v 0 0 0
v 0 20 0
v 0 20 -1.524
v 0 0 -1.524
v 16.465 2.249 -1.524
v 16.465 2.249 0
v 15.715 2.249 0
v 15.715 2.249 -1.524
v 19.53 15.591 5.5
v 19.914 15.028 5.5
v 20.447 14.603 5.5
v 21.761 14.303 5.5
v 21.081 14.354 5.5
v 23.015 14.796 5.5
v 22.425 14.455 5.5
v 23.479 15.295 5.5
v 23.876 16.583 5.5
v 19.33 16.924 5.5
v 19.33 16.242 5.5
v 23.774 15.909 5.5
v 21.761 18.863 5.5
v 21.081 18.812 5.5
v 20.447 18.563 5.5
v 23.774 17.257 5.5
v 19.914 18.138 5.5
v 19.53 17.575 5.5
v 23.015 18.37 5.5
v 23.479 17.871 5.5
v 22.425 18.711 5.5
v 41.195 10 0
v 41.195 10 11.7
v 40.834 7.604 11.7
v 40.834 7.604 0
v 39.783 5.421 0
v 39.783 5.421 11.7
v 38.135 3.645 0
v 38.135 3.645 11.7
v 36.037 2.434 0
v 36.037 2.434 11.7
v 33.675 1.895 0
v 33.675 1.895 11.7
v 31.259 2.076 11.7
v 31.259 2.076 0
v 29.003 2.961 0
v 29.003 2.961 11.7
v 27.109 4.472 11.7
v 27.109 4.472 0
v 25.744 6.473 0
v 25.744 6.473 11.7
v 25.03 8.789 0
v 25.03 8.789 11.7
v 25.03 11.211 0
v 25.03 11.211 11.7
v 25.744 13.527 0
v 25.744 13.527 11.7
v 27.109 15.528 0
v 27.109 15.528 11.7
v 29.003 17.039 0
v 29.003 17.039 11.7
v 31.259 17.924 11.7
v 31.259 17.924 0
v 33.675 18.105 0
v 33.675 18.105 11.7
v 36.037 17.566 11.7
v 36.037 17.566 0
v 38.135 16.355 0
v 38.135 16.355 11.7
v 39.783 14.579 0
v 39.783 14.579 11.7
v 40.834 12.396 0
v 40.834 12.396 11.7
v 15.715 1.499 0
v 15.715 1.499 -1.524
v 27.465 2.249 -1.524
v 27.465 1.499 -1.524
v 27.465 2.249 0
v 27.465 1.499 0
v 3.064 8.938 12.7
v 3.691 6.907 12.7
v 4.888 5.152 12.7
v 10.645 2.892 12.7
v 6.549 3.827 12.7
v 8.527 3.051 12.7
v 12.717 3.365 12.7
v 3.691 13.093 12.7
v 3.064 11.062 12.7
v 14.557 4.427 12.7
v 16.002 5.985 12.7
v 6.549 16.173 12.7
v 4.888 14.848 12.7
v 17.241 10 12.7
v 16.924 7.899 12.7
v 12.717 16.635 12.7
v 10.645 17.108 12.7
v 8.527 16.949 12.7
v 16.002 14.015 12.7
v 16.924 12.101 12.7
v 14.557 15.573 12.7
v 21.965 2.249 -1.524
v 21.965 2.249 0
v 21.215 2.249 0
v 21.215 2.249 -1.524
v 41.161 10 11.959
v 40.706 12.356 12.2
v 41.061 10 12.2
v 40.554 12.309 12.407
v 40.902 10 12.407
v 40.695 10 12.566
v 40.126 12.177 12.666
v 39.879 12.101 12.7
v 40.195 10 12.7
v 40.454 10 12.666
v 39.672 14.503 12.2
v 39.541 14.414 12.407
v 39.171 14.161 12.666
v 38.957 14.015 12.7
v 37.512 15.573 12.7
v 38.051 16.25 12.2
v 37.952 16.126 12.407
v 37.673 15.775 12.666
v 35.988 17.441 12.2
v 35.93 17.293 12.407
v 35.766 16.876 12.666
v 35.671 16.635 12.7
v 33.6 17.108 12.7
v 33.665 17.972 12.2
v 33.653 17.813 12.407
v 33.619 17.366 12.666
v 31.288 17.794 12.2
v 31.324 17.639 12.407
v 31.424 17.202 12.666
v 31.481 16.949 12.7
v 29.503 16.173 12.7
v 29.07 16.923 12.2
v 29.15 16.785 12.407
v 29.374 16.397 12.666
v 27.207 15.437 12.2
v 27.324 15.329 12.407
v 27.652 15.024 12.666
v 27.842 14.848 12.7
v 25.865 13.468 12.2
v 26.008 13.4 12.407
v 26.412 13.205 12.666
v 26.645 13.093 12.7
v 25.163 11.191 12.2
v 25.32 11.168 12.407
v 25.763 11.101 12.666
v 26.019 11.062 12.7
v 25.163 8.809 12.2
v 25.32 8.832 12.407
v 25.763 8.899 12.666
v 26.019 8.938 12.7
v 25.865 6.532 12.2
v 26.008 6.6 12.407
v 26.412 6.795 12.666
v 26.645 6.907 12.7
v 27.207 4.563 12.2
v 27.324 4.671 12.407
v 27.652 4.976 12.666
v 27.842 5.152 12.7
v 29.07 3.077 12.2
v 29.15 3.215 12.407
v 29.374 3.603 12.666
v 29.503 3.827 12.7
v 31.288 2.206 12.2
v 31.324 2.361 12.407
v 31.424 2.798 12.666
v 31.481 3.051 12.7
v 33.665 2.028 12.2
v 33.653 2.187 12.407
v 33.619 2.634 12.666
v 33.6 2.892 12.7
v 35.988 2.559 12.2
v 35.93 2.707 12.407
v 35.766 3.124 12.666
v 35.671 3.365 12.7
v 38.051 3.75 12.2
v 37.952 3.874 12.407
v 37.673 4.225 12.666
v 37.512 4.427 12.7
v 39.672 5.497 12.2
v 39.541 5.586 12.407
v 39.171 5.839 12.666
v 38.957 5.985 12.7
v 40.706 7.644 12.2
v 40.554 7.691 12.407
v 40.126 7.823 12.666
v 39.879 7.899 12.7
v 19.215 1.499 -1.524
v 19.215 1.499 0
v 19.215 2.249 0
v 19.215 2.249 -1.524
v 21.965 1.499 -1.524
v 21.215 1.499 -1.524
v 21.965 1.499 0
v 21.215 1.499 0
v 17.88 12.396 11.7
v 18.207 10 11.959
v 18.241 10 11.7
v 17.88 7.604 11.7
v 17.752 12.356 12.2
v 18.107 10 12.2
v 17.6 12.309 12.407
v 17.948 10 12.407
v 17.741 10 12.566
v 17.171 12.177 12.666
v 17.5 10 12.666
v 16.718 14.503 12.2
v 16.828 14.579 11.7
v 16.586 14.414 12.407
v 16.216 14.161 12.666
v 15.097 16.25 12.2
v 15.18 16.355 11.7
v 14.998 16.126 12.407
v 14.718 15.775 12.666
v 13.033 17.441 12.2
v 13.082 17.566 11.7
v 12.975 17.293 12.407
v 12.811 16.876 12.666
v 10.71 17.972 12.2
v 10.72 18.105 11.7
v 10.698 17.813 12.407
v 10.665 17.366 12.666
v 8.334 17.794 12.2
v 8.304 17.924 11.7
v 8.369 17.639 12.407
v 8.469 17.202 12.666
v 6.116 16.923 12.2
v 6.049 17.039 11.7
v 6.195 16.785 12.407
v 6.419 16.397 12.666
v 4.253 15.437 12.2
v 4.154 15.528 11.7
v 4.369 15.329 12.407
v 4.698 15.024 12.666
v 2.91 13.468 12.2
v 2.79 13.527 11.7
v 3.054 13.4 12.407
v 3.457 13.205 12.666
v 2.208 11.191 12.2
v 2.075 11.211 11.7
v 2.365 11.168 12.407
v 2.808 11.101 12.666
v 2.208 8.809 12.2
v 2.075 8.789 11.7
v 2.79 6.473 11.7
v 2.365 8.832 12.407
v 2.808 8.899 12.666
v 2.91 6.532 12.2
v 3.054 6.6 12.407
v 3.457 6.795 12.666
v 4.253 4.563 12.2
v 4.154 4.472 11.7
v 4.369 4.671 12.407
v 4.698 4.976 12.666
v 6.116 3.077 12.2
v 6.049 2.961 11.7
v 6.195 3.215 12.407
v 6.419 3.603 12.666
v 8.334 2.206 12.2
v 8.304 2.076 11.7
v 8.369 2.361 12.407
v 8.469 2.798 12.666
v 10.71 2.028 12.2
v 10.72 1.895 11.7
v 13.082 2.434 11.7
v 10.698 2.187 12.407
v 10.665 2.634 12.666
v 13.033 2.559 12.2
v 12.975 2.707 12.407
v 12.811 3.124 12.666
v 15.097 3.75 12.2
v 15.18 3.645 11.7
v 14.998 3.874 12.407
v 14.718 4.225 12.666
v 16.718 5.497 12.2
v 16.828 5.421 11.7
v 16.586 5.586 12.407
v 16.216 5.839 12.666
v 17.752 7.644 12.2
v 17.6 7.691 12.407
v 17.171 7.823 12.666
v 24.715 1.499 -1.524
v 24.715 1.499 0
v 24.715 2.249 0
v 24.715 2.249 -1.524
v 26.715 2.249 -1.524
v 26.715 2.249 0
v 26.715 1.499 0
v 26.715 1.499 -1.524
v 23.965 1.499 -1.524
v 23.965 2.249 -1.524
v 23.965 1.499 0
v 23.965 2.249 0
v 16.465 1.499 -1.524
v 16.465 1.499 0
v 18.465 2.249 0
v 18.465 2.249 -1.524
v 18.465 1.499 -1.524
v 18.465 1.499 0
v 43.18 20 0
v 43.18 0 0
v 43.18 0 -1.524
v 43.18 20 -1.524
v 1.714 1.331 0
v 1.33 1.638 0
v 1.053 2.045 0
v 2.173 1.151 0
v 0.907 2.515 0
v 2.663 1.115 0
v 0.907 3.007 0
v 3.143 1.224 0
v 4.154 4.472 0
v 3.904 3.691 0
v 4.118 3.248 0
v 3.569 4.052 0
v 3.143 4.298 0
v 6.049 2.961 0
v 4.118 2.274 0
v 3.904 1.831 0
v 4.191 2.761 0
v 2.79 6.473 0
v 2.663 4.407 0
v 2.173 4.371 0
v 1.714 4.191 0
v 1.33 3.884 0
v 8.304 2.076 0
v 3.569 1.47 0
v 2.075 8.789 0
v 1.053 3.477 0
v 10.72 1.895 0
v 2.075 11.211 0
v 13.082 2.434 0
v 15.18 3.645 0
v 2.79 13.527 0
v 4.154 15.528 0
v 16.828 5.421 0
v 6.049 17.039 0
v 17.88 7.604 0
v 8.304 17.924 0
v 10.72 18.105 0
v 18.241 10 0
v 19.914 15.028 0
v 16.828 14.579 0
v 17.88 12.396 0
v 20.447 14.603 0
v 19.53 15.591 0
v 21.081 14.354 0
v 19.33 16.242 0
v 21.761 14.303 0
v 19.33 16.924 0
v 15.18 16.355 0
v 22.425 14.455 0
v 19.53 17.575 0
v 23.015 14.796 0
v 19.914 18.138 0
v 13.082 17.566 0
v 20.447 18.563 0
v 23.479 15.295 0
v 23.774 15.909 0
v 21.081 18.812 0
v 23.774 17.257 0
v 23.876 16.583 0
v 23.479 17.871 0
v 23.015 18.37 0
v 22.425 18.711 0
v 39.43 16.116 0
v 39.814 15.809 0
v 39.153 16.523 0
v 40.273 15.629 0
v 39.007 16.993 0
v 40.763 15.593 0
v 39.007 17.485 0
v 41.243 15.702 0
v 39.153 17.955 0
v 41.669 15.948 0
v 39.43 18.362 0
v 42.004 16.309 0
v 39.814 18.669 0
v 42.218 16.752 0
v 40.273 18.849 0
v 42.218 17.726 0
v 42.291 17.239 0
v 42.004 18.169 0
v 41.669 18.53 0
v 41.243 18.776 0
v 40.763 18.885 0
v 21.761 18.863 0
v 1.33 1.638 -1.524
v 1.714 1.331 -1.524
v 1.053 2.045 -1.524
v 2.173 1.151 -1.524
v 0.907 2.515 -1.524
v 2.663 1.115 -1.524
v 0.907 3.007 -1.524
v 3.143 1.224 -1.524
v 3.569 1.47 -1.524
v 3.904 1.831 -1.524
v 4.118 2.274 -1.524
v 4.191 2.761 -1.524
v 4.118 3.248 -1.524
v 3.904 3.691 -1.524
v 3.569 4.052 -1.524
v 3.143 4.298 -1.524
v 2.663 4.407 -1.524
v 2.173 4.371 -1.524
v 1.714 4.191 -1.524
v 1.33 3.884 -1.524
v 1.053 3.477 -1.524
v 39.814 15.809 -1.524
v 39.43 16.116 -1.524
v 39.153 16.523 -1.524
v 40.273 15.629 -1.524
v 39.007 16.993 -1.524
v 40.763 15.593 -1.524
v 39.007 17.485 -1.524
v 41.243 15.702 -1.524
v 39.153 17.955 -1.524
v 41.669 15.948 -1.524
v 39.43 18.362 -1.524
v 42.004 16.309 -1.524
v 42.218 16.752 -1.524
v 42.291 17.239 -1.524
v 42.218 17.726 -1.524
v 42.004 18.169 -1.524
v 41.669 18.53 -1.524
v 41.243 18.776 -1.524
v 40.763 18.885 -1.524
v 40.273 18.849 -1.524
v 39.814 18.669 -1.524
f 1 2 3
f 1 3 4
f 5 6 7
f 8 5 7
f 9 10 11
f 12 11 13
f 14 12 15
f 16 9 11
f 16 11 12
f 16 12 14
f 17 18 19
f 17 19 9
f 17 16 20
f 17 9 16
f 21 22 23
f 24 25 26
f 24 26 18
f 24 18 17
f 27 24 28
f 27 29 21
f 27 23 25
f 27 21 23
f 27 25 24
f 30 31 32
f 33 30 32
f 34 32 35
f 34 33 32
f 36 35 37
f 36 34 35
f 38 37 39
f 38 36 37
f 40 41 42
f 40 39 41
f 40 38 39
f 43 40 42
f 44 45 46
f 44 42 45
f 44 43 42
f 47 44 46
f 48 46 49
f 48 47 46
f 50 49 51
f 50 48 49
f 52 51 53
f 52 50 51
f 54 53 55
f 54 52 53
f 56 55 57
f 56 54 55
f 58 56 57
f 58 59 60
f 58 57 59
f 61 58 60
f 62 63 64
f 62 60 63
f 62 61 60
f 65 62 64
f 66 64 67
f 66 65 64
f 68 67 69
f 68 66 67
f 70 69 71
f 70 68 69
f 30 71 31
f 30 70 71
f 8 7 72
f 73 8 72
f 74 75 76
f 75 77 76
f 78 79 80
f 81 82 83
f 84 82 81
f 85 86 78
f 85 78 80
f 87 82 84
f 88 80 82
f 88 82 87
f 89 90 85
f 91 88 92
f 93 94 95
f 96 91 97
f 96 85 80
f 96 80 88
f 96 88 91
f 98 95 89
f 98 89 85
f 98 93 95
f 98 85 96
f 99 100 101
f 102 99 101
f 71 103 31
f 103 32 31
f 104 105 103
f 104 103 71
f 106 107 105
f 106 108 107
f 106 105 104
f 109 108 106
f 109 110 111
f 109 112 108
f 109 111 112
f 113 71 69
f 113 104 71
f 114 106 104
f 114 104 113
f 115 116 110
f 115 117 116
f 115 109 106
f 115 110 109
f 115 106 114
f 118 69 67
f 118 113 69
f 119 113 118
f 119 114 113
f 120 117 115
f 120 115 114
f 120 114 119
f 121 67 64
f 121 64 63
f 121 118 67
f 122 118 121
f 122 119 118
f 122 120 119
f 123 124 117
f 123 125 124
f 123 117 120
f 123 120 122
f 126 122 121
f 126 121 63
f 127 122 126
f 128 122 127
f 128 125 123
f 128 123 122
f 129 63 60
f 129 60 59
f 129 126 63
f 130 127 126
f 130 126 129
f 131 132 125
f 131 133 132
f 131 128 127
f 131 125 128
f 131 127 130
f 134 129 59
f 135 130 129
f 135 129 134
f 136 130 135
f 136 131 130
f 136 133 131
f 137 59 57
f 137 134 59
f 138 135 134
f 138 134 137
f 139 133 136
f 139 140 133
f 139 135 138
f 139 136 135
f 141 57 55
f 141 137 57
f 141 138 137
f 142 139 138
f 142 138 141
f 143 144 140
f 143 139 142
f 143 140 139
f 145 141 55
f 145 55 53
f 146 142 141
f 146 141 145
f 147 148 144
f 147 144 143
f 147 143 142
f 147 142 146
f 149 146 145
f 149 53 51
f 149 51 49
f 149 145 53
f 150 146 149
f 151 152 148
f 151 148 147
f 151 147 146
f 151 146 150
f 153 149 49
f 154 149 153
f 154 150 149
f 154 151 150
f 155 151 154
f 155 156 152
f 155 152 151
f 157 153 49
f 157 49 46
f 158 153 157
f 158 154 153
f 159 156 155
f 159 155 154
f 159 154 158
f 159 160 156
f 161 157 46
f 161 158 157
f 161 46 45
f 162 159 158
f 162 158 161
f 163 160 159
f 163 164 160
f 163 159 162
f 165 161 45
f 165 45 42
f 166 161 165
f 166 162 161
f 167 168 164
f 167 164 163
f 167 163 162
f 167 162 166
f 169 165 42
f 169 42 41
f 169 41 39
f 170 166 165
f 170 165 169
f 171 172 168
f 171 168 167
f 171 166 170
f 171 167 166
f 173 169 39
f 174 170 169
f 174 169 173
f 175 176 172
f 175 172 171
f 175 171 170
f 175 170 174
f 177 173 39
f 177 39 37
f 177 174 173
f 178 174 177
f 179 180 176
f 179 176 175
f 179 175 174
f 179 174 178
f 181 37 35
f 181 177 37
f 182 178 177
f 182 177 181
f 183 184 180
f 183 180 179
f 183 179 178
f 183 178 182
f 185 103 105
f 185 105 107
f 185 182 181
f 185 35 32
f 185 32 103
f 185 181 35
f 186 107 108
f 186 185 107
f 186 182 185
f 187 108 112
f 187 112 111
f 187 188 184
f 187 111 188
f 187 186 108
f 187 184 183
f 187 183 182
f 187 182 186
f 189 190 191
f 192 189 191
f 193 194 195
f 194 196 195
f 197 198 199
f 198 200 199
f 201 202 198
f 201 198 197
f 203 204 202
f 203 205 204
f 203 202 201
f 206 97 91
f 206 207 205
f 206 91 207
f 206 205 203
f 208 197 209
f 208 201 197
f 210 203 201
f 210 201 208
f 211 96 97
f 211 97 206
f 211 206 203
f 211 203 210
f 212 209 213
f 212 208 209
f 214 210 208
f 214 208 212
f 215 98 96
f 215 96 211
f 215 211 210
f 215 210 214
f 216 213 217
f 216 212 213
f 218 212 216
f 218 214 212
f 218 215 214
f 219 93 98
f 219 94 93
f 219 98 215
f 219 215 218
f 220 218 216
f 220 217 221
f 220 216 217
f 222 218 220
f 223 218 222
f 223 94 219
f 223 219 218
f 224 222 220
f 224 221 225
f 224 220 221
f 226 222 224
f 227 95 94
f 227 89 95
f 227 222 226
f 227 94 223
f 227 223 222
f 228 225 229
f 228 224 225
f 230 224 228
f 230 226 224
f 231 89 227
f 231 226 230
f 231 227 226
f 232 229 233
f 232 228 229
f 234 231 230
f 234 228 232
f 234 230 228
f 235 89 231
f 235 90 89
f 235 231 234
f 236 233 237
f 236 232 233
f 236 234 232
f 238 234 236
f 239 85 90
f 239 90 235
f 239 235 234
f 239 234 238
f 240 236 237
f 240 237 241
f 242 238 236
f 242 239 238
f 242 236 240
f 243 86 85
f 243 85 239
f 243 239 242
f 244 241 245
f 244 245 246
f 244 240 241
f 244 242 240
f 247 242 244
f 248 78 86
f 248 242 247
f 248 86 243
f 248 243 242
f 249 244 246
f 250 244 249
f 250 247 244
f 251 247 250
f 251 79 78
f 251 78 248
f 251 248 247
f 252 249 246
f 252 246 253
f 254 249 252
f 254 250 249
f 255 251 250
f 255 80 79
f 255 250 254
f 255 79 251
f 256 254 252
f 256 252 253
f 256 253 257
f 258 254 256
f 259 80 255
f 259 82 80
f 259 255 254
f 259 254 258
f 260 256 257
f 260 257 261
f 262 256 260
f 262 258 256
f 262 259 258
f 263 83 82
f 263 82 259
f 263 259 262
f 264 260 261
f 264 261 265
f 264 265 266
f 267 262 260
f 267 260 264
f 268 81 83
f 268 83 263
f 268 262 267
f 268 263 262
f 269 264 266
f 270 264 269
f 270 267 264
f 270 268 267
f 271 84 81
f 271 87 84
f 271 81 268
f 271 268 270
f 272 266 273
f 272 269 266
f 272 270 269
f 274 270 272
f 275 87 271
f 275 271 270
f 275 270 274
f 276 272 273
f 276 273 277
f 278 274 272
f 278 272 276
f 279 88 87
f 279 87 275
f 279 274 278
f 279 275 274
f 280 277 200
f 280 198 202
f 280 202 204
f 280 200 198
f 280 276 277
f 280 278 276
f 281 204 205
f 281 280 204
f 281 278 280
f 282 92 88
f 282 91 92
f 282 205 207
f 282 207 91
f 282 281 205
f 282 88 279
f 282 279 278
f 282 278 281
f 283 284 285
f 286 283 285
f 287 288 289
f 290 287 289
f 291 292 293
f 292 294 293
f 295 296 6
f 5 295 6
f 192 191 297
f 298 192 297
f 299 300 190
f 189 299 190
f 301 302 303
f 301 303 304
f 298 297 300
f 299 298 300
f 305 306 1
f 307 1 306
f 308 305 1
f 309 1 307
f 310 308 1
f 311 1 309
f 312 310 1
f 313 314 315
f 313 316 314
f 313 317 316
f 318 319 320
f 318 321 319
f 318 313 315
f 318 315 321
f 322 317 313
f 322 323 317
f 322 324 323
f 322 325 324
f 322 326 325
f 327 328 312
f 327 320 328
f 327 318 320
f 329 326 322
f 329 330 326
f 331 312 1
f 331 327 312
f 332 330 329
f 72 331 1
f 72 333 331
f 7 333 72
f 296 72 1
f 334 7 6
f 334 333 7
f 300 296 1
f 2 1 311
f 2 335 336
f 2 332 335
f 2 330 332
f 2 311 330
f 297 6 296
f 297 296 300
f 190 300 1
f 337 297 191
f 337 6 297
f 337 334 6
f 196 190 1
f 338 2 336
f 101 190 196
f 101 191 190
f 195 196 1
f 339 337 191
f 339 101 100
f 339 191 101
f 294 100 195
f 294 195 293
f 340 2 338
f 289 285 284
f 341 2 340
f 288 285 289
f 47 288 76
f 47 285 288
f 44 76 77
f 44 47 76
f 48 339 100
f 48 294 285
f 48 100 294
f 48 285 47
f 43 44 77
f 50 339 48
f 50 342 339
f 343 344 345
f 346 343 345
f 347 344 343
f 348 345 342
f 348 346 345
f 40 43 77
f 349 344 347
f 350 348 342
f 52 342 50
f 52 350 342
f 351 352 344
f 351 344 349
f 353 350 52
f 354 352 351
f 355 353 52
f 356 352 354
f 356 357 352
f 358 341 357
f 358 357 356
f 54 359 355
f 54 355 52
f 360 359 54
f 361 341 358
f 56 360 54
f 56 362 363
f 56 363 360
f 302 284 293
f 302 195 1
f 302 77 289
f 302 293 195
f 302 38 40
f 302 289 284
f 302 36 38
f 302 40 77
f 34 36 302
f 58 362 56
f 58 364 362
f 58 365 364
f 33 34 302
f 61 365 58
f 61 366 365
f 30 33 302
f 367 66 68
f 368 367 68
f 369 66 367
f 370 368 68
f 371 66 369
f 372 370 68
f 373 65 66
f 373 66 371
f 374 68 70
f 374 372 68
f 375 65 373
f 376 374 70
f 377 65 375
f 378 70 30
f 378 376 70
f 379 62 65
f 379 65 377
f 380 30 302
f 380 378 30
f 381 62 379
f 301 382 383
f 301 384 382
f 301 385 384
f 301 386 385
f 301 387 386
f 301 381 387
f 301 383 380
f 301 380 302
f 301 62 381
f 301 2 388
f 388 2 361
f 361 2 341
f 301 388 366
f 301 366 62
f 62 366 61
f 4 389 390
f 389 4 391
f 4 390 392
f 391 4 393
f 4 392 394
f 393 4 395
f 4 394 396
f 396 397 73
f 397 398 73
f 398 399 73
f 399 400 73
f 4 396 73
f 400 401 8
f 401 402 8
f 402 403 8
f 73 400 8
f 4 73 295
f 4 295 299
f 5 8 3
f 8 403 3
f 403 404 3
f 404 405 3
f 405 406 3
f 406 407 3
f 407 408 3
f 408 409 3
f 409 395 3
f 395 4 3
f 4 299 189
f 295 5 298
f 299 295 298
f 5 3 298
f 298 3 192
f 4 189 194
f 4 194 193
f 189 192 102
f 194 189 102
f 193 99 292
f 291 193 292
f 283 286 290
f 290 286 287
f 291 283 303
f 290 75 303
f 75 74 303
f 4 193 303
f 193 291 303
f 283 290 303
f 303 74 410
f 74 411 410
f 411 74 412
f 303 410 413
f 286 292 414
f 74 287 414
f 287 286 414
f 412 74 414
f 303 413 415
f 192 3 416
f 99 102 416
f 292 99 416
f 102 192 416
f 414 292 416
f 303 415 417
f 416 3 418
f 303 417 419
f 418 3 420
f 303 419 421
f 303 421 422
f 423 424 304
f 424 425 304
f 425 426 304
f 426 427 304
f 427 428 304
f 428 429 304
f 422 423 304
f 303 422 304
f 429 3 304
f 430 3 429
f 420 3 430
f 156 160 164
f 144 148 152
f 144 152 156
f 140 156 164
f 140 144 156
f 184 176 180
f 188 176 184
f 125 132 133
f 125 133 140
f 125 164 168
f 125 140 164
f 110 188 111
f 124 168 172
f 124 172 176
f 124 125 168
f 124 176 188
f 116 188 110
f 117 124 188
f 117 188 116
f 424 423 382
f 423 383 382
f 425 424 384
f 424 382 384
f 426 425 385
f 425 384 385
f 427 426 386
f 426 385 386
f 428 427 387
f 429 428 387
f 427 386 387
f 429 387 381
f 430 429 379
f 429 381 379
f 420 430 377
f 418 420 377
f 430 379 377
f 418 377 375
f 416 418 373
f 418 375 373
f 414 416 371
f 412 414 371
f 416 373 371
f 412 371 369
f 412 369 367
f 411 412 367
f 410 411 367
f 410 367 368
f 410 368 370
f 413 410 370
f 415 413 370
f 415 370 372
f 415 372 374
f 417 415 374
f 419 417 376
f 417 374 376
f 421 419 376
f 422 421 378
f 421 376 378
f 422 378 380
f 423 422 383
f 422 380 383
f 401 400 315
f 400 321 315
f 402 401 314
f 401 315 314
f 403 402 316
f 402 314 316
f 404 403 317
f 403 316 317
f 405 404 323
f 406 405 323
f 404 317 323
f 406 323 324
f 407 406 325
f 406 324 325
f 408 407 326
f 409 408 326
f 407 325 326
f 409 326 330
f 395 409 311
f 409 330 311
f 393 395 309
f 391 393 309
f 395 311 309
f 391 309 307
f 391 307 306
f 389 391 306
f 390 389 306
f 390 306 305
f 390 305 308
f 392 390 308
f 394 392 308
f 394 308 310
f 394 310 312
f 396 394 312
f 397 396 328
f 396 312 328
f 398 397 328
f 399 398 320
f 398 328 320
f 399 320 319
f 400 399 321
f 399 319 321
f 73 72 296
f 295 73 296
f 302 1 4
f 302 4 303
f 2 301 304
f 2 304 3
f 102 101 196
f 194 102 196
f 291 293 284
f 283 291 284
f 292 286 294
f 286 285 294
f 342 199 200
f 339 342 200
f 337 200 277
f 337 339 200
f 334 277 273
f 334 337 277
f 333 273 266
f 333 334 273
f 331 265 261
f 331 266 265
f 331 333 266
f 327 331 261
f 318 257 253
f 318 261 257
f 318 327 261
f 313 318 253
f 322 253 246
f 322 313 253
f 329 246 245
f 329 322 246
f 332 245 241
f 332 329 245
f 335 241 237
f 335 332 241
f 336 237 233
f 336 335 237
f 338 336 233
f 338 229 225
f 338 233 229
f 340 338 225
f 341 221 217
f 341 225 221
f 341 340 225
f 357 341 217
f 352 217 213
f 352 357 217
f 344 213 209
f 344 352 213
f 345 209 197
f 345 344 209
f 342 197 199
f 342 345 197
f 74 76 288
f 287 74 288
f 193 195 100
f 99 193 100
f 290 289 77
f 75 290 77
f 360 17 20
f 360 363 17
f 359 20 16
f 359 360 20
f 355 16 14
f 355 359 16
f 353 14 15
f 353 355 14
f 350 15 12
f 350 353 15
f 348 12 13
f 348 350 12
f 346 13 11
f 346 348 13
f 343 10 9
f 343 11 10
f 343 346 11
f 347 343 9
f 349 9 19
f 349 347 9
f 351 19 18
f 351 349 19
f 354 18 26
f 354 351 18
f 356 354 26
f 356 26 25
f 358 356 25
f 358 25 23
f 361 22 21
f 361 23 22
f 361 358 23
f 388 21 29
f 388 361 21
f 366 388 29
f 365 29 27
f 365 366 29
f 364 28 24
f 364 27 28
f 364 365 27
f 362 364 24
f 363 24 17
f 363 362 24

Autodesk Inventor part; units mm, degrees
ref_plane "YZ Plane" through (0, 0, 0) normal (1, 0, 0) x (0, 1, 0)
ref_plane "XZ Plane" through (0, 0, 0) normal (0, 1, 0) x (-1, 0, 0)
ref_plane "XY Plane" through (0, 0, 0) normal (0, 0, 1) x (1, 0, 0)
sketch "Skizze1" plane through (0, 0, 0) normal (0, 0, 1) x (1, 0, 0)
  line L0 (0, 0) -> (43.18, 0)
  line L1 (43.18, 0) -> (43.18, 20)
  line L2 (43.18, 20) -> (0, 20)
  line L3 (0, 20) -> (0, 0)
  circle A0 centre (2.54, 2.761) radius 1.651
  circle A1 centre (40.64, 17.239) radius 1.651
  line L4 (21.59, 20) -> (21.59, 0) construction
  line L5 (2.54, 2.761) -> (40.64, 2.761) construction
  line L6 (40.64, 2.761) -> (40.64, 17.239) construction
  line L7 (40.64, 17.239) -> (2.54, 17.239) construction
  line L8 (2.54, 17.239) -> (2.54, 2.761) construction
  line L9 (0, 10) -> (43.18, 10) construction
  line L10 (21.965, 2.2486) -> (21.215, 2.2486)
  line L11 (21.215, 2.2486) -> (21.215, 1.4986)
  line L12 (21.215, 1.4986) -> (21.965, 1.4986)
  line L13 (21.965, 1.4986) -> (21.965, 2.2486)
  line L14 (24.715, 2.2486) -> (23.965, 2.2486)
  line L15 (24.715, 1.4986) -> (24.715, 2.2486)
  line L16 (23.965, 1.4986) -> (24.715, 1.4986)
  line L17 (23.965, 2.2486) -> (23.965, 1.4986)
  line L18 (27.465, 2.2486) -> (26.715, 2.2486)
  line L19 (27.465, 1.4986) -> (27.465, 2.2486)
  line L20 (26.715, 1.4986) -> (27.465, 1.4986)
  line L21 (26.715, 2.2486) -> (26.715, 1.4986)
  line L22 (19.215, 2.2486) -> (18.465, 2.2486)
  line L23 (19.215, 1.4986) -> (19.215, 2.2486)
  line L24 (18.465, 1.4986) -> (19.215, 1.4986)
  line L25 (18.465, 2.2486) -> (18.465, 1.4986)
  line L26 (21.965, 2.2486) -> (21.215, 2.2486)
  line L27 (21.965, 1.4986) -> (21.965, 2.2486)
  line L28 (21.215, 1.4986) -> (21.965, 1.4986)
  line L29 (21.215, 2.2486) -> (21.215, 1.4986)
  line L30 (24.715, 2.2486) -> (23.965, 2.2486)
  line L31 (24.715, 1.4986) -> (24.715, 2.2486)
  line L32 (23.965, 1.4986) -> (24.715, 1.4986)
  line L33 (23.965, 2.2486) -> (23.965, 1.4986)
  line L34 (16.465, 2.2486) -> (15.715, 2.2486)
  line L35 (16.465, 1.4986) -> (16.465, 2.2486)
  line L36 (15.715, 1.4986) -> (16.465, 1.4986)
  line L37 (15.715, 2.2486) -> (15.715, 1.4986)
  line L38 (19.215, 2.2486) -> (18.465, 2.2486)
  line L39 (19.215, 1.4986) -> (19.215, 2.2486)
  line L40 (18.465, 1.4986) -> (19.215, 1.4986)
  line L41 (18.465, 2.2486) -> (18.465, 1.4986)
  line L42 (21.965, 2.2486) -> (21.215, 2.2486)
  line L43 (21.965, 1.4986) -> (21.965, 2.2486)
  line L44 (21.215, 1.4986) -> (21.965, 1.4986)
  line L45 (21.215, 2.2486) -> (21.215, 1.4986)
  point P0 (21.59, 17.239)
  point P1 (40.64, 10)
  point P2 (21.59, 2.2486)
  point P3 (24.34, 2.2486)
  point P4 (27.09, 2.2486)
  point P5 (18.84, 2.2486)
  point P6 (21.59, 2.2486)
  point P7 (24.34, 2.2486)
  point P8 (16.09, 2.2486)
  point P9 (18.84, 2.2486)
  point P10 (21.59, 2.2486)
  dimension "d0" = 43.18
  dimension "d1" = 20
  dimension "d2" = 3.302
  dimension "d4" = 38.1
  dimension "d5" = 14.478
  dimension "d26" = 1.4986
  dimension "d27" = 0.75
  dimension "d30" = 2.75
  dimension "d33" = 2.75
extrude "Extrusion1" add sketch "Skizze1" against normal blind 1.524
sketch "Skizze2" plane through (0, 0, 0) normal (0, 0, 1) x (1, 0, 0)
  circle A0 centre (10.1127, 10) radius 8.128
  circle A1 centre (33.0673, 10) radius 8.128
  line L0 (0, 0) -> (0, 20) construction
  line L1 (0, 10) -> (43.18, 10) construction
  line L2 (43.18, 0) -> (43.18, 20) construction
  line L3 (10.1127, 10) -> (33.0673, 10) construction
  point P0 (21.59, 10)
  dimension "d19" = 16.256
extrude "Extrusion2" add sketch "Skizze2" along normal blind 12.7
fillet "Rundung1" radius 1 2 edges at (24.9393, 10, 12.7) (1.9847, 10, 12.7)
sketch "Skizze3" plane through (0, 0, 0) normal (0, 0, 1) x (1, 0, 0)
  line L0 (43.18, 20) -> (0, 20) construction
  line L1 (21.59, 20) -> (21.59, 16.583) construction
  circle A0 centre (21.59, 16.583) radius 2.286
  point P0 (0, 0)
  dimension "d23" = 4.572
extrude "Extrusion3" add sketch "Skizze3" along normal blind 5.5
properties part number "SRF08"
